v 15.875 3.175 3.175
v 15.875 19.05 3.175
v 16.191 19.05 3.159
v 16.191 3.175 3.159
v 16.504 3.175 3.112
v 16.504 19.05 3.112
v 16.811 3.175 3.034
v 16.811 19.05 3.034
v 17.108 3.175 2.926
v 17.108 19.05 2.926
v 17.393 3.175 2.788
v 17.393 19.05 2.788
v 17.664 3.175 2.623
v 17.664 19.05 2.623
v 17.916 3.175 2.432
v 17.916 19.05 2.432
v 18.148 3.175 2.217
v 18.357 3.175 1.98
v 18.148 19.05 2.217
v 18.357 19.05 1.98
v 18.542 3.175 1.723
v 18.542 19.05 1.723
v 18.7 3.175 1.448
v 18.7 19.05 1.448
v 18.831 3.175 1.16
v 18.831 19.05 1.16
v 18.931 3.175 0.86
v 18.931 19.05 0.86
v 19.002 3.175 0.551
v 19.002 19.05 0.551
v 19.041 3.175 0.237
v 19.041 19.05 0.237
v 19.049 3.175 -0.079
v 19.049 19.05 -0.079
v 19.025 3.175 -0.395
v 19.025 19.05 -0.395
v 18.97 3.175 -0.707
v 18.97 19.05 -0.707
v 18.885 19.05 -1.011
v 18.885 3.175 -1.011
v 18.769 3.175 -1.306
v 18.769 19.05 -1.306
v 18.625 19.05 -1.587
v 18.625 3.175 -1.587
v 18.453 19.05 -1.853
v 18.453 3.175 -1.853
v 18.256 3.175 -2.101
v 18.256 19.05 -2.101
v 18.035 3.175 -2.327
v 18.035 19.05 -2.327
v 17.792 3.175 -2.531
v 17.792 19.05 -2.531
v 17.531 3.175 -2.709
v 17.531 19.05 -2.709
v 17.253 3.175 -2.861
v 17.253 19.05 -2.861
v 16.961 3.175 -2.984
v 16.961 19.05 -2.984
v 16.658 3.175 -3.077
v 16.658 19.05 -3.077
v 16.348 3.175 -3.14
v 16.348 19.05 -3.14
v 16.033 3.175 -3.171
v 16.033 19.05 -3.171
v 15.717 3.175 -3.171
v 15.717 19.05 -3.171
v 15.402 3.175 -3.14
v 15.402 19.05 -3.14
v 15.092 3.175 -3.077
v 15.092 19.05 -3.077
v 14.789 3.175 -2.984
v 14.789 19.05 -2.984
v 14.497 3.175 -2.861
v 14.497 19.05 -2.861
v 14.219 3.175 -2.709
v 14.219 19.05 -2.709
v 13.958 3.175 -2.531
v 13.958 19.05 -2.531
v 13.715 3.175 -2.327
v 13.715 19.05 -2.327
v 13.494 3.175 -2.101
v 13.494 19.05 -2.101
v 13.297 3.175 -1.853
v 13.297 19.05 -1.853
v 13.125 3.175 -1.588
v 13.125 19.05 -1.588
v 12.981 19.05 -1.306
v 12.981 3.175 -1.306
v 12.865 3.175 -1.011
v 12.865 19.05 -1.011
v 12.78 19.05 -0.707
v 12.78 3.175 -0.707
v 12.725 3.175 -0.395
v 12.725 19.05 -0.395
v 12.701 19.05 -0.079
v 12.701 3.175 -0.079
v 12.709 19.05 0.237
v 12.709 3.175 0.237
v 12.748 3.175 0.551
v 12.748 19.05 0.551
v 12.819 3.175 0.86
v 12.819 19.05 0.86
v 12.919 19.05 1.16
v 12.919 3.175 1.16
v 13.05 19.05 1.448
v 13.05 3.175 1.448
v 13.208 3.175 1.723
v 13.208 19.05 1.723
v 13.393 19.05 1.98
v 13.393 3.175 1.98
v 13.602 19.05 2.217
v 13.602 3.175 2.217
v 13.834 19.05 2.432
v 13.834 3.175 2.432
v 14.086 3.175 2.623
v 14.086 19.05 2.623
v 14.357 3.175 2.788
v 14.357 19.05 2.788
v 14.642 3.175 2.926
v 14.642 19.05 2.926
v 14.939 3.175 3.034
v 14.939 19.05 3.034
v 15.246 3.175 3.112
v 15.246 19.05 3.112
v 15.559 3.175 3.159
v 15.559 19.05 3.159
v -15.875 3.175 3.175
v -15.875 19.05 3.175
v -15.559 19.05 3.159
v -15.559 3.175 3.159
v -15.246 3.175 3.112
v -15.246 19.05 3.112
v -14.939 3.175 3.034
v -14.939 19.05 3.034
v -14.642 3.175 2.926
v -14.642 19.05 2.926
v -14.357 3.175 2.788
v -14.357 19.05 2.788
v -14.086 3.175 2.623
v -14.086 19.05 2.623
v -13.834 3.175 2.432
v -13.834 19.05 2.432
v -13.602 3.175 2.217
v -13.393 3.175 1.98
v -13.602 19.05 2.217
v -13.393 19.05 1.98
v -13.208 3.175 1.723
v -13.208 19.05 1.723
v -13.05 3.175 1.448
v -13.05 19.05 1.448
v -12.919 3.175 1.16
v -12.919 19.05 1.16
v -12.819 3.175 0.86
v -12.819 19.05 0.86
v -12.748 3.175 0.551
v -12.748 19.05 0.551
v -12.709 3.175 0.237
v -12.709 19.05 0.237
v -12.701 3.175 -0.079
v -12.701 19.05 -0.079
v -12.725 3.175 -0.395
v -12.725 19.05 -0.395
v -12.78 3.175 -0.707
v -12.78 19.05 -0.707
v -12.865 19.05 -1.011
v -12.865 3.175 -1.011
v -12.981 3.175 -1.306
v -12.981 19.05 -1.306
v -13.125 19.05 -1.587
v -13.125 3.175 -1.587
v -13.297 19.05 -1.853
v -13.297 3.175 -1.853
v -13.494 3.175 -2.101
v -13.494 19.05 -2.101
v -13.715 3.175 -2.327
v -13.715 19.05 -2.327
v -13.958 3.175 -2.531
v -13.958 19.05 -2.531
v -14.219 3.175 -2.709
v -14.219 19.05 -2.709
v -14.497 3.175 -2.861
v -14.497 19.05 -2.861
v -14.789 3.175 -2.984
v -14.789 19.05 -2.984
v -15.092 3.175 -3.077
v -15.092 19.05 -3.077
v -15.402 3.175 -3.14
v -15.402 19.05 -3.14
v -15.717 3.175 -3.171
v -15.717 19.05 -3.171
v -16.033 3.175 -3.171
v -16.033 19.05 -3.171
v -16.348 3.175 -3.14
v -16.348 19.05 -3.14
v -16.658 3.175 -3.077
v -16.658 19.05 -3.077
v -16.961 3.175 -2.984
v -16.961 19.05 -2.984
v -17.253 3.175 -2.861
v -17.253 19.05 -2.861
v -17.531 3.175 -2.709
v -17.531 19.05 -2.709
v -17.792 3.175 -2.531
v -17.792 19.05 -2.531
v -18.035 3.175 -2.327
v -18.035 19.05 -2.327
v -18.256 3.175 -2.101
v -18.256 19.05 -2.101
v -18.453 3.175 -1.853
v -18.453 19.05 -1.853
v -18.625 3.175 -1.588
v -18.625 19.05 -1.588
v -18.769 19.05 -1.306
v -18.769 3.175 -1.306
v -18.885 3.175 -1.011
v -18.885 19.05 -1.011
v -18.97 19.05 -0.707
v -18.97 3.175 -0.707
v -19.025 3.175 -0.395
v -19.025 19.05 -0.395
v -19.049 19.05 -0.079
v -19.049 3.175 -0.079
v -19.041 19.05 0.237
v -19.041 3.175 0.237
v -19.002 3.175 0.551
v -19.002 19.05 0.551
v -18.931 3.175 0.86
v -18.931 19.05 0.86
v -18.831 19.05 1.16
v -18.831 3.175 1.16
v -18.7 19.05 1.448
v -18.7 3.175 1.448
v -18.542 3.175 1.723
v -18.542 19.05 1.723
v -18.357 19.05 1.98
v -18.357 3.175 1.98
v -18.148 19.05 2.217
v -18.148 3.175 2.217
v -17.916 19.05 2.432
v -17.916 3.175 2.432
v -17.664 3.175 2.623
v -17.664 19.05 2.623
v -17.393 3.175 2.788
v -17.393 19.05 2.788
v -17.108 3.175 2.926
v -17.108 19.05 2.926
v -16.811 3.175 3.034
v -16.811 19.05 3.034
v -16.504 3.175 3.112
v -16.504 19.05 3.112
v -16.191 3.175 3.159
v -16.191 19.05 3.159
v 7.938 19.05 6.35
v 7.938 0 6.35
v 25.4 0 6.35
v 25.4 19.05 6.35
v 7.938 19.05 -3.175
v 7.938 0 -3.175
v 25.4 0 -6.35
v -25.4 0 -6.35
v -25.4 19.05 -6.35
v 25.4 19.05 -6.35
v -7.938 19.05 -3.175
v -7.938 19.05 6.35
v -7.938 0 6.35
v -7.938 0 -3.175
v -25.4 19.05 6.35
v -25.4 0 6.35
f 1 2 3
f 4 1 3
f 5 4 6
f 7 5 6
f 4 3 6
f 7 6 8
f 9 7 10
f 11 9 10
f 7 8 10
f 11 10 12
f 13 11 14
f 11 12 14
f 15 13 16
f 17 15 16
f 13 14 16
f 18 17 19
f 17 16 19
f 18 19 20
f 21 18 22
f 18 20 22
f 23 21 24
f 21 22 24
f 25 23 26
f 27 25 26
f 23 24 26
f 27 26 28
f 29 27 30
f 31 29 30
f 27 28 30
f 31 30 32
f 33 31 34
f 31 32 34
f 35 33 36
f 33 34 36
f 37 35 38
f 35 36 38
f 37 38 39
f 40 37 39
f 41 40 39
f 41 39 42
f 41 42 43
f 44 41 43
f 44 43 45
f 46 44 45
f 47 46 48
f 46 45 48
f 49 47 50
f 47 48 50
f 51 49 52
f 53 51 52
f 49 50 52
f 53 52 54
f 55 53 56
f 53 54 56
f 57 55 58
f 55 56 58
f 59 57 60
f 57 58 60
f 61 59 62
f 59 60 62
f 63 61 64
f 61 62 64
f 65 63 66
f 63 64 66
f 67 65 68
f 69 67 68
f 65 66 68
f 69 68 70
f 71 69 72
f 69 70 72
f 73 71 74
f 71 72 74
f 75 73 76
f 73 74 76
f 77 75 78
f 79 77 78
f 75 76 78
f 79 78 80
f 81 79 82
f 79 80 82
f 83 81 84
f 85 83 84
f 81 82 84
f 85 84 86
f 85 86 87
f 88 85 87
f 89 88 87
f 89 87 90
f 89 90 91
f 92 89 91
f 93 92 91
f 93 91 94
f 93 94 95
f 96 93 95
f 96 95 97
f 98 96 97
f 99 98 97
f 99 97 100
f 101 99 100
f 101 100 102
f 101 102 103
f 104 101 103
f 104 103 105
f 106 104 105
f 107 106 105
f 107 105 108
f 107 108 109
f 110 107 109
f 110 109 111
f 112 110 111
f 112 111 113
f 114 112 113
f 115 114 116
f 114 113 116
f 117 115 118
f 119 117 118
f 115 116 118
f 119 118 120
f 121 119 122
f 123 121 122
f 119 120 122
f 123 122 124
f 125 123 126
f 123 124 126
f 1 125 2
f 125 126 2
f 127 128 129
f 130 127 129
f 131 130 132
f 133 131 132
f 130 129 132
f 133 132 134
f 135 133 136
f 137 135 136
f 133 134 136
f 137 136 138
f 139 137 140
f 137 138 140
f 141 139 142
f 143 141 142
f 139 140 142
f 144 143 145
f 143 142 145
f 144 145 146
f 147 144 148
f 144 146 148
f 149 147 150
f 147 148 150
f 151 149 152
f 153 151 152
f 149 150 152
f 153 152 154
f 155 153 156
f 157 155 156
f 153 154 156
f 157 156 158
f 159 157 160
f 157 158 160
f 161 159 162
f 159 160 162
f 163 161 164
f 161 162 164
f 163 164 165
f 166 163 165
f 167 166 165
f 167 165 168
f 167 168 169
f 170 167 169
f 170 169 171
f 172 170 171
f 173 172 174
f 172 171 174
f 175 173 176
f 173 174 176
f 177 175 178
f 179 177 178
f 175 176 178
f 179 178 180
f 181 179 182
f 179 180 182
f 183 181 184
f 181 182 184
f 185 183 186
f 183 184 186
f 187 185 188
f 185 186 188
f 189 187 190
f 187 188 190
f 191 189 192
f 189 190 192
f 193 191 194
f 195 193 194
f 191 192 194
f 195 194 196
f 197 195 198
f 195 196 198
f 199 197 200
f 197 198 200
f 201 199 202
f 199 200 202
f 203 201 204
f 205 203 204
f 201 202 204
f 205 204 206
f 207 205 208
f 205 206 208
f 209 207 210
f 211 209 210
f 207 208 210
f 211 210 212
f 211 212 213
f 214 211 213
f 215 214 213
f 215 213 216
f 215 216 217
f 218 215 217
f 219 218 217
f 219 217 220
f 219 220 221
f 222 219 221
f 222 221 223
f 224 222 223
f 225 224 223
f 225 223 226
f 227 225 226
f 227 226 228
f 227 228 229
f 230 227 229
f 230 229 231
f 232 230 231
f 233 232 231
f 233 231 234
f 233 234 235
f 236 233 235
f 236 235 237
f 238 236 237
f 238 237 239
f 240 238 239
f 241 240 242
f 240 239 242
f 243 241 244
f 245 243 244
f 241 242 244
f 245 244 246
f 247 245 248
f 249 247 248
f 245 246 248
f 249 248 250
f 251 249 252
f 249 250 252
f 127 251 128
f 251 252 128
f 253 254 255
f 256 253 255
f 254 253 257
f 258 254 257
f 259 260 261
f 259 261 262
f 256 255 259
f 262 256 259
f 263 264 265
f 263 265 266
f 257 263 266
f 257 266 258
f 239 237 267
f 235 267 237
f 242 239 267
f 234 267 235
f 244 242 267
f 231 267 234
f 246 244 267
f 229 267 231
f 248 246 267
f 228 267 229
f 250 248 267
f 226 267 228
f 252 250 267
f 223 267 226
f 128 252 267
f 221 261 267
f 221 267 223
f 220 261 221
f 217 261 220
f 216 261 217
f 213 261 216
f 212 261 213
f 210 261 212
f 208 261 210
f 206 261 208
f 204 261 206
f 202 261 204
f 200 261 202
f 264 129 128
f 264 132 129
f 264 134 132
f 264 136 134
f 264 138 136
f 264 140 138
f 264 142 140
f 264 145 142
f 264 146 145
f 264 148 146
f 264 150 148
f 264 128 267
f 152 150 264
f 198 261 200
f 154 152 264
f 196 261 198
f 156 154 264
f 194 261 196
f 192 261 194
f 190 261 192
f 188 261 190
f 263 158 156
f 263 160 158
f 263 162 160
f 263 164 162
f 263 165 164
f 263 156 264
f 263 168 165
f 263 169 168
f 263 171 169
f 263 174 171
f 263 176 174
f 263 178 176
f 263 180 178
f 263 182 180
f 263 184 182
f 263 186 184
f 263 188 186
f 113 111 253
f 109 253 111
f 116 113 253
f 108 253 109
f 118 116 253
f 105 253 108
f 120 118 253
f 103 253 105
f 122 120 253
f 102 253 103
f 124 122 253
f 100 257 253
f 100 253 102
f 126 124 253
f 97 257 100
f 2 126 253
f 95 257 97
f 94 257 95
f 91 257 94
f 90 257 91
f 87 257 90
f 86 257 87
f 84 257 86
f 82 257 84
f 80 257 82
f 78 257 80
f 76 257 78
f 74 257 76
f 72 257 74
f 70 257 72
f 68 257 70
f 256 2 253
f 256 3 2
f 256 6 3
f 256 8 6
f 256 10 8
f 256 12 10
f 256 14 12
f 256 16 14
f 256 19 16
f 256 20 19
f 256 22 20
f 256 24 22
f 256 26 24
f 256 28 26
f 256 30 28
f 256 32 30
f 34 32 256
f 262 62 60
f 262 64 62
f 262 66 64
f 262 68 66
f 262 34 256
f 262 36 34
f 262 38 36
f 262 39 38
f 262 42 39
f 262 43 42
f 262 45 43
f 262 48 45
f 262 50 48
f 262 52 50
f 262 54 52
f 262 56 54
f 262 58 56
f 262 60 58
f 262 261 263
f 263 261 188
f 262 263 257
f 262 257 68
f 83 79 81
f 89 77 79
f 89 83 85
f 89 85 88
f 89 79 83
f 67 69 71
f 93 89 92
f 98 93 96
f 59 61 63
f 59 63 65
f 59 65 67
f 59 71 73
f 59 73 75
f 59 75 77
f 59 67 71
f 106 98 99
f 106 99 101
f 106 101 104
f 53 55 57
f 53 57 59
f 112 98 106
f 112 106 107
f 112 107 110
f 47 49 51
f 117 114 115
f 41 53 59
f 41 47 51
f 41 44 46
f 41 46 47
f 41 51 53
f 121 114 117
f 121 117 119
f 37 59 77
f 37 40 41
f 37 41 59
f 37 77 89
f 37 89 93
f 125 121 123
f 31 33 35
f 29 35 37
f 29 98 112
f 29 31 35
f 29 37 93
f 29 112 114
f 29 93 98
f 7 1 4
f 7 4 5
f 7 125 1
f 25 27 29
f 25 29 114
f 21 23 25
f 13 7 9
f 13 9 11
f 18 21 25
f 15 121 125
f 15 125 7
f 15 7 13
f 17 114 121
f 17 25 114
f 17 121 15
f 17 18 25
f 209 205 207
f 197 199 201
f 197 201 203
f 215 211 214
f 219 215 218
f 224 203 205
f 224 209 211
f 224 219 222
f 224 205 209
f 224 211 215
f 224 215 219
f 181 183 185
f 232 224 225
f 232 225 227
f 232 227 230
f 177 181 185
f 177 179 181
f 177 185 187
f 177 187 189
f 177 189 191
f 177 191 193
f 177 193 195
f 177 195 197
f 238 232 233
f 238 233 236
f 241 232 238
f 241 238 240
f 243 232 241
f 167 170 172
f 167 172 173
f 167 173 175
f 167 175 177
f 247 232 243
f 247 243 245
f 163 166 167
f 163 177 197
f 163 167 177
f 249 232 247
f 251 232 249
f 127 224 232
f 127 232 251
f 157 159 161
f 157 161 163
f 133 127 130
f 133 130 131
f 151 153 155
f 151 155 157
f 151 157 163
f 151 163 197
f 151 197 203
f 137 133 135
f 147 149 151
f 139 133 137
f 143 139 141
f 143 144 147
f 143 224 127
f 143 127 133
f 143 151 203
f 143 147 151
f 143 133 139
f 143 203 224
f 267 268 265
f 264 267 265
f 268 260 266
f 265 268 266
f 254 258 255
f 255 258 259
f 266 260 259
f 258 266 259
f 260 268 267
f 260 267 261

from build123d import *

# Parameters (mm, degrees)
SKETCH1_W           = 50.8
SKETCH1_H           = 12.7
BOSS_EXTRUDE1_DEPTH = 19.05
SKETCH2_R           = 3.175
CUT_EXTRUDE1_DEPTH  = 15.875
SKETCH3_W           = 15.875
SKETCH3_H           = 9.525
CUT_EXTRUDE2_DEPTH  = 33.378773911


with BuildPart() as part:
    # Sketch1 → Boss-Extrude1 (new body)
    with BuildSketch(Plane(origin=(0, 0, 0), x_dir=(1, 0, 0), z_dir=(0, 1, 0))):
        Rectangle(SKETCH1_W, SKETCH1_H)
    extrude(amount=BOSS_EXTRUDE1_DEPTH)

    # Sketch2 → Cut-Extrude1 (cut)
    with BuildSketch(Plane(origin=(0, 19.05, 0), x_dir=(1, 0, 0), z_dir=(0, 1, 0))):
        with Locations(Location((-15.875, 0, 0), (0, 0, 270))):
            Circle(SKETCH2_R)
        with Locations(Location((15.875, 0, 0), (0, 0, 270))):
            Circle(SKETCH2_R)
    extrude(amount=-CUT_EXTRUDE1_DEPTH, mode=Mode.SUBTRACT)

    # Sketch3 → Cut-Extrude2 (cut, through all)
    with BuildSketch(Plane(origin=(0, 19.05, 0), x_dir=(1, 0, 0), z_dir=(0, 1, 0))):
        with Locations((0, -1.5875)):
            Rectangle(SKETCH3_W, SKETCH3_H)
    extrude(amount=-CUT_EXTRUDE2_DEPTH, mode=Mode.SUBTRACT)


solid = part.part
